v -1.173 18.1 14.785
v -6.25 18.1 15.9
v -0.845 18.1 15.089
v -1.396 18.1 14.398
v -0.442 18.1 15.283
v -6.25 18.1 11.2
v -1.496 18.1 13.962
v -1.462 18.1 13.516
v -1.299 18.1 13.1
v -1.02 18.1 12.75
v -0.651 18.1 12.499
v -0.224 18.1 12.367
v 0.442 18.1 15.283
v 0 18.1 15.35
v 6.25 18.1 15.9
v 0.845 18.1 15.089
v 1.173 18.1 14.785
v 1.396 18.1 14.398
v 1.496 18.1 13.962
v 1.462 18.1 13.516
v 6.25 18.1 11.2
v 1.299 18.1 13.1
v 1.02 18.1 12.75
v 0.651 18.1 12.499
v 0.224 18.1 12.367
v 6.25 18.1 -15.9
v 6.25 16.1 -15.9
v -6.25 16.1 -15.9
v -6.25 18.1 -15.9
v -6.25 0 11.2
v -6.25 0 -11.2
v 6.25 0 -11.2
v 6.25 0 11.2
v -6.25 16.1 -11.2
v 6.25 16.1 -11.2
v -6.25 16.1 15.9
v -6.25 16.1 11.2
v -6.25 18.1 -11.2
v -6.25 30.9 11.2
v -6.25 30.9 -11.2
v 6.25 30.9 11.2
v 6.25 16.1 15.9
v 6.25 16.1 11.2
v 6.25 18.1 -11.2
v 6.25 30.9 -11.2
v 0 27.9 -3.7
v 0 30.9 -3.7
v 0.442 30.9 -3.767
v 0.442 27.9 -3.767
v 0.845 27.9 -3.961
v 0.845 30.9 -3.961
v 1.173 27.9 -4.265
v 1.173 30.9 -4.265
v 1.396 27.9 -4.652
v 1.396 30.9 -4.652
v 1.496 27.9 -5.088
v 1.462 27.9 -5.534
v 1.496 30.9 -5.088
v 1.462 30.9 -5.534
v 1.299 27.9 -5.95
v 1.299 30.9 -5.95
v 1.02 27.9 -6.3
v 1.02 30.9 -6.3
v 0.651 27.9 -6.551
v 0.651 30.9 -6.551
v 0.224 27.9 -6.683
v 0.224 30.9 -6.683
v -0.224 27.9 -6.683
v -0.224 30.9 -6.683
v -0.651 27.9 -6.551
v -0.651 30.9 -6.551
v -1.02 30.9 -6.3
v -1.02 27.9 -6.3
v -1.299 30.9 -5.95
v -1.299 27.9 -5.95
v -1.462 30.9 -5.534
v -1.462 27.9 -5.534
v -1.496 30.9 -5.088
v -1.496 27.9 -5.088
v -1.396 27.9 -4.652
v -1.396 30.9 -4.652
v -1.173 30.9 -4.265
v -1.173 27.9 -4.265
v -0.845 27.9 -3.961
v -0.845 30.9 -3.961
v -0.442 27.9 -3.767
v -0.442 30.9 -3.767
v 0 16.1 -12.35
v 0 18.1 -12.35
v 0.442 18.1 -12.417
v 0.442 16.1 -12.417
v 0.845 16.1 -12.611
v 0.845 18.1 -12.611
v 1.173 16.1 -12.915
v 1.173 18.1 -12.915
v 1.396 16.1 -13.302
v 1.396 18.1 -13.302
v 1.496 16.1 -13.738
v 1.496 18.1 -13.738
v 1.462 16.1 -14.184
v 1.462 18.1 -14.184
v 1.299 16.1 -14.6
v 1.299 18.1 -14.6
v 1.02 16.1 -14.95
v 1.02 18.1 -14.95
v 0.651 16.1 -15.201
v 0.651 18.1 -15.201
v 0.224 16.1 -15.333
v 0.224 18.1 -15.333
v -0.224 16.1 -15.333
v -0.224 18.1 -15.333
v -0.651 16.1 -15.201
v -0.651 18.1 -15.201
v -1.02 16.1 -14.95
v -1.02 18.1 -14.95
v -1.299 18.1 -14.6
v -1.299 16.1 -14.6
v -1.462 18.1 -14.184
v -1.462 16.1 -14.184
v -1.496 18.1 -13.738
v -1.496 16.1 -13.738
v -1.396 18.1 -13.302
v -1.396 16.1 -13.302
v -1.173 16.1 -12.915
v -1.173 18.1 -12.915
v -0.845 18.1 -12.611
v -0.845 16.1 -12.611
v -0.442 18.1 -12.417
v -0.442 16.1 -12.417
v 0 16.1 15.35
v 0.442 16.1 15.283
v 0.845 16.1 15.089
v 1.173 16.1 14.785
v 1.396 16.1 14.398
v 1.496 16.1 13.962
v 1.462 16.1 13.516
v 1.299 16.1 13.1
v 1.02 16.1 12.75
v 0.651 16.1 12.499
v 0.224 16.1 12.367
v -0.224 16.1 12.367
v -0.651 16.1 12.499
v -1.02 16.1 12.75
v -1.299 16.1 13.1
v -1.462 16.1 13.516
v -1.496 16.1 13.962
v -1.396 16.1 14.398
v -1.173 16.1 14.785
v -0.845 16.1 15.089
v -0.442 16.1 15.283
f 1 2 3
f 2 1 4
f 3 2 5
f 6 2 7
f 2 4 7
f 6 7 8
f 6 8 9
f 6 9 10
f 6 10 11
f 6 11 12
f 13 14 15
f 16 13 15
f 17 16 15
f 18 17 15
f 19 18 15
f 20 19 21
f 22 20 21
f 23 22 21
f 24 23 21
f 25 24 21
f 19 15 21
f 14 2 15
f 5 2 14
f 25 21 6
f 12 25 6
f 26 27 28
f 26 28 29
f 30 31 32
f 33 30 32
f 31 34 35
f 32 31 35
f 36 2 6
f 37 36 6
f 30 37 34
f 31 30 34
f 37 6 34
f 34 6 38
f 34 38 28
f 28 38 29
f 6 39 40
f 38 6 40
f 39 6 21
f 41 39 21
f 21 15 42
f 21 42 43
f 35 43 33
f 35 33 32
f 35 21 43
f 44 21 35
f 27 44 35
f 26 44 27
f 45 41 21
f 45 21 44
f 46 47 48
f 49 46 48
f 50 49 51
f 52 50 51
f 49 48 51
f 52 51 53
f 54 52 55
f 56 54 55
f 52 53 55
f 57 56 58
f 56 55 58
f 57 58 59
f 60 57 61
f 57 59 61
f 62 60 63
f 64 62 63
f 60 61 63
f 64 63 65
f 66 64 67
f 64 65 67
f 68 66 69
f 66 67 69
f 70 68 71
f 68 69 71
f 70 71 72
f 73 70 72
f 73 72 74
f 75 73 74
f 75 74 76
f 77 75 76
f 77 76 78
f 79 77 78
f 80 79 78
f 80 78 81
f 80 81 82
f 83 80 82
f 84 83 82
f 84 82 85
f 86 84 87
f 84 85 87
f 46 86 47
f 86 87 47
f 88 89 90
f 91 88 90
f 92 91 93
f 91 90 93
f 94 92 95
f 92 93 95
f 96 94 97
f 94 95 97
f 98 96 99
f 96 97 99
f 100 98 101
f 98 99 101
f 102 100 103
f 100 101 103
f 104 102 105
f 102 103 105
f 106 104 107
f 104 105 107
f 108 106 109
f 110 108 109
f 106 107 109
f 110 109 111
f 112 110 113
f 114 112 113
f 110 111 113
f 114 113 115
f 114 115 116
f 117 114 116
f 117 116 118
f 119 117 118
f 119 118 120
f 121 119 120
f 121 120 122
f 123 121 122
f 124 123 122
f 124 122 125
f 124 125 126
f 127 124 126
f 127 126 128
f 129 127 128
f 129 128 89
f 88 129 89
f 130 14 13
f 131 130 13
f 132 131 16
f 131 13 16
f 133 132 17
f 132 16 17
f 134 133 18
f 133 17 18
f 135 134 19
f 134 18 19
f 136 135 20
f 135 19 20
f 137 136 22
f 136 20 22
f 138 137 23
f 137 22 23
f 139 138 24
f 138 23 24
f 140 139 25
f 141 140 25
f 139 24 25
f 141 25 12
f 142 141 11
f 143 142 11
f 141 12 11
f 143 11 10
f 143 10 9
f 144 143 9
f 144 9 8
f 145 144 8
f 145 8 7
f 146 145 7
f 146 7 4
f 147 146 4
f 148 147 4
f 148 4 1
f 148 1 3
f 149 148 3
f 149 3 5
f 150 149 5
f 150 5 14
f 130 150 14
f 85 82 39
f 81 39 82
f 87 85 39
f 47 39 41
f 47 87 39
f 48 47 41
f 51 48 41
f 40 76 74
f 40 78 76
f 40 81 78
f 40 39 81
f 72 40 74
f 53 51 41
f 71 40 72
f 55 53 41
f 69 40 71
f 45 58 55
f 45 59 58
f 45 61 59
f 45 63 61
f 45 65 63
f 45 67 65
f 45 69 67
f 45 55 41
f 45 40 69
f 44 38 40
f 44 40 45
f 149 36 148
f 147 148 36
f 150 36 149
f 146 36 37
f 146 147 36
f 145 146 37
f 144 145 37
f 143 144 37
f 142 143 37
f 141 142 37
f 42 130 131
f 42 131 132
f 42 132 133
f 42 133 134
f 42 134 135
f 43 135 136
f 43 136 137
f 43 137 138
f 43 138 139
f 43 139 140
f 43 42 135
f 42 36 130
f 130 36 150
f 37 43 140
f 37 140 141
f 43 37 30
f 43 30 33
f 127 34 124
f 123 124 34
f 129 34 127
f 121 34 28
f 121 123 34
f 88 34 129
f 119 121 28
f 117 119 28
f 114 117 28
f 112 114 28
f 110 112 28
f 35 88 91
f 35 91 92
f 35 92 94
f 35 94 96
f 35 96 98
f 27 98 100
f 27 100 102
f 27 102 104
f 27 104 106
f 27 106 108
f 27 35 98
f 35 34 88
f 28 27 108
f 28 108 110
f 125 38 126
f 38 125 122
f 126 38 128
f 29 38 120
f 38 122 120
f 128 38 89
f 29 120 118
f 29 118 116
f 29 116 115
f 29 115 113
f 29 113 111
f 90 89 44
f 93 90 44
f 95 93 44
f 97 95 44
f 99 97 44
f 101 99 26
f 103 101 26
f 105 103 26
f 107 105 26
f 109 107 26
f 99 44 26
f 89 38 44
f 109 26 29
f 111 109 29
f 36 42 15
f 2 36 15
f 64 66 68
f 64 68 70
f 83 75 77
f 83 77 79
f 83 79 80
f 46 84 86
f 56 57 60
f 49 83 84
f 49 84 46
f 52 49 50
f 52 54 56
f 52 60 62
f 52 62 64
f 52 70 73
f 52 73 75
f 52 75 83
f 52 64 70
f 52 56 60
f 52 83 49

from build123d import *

# Parameters (mm, degrees)
SKETCH_1_W          = 12.5
SKETCH_1_H          = 22.4
EXTRUDE_1_DEPTH     = 30.9
SKETCH_4_W          = 31.8
SKETCH_4_H          = 2
EXTRUDE_2_DEPTH     = 12.5
SKETCH_6_R          = 1.5
CUT_EXTRUDE_2_DEPTH = 25.889405377
SKETCH_7_R          = 1.5
CUT_EXTRUDE_3_DEPTH = 3


with BuildPart() as part:
    # 草图1 → 凸台-拉伸1 (new body)
    with BuildSketch(Plane(origin=(0, 0, 0), x_dir=(1, 0, 0), z_dir=(0, 1, 0))):
        Rectangle(SKETCH_1_W, SKETCH_1_H)
    extrude(amount=EXTRUDE_1_DEPTH)

    # 草图4 → 凸台-拉伸2 (add)
    with BuildSketch(Plane(origin=(6.25, 0, 0), x_dir=(0, 0, -1), z_dir=(1, 0, 0))):
        with Locations((0, 17.1)):
            Rectangle(SKETCH_4_W, SKETCH_4_H)
    extrude(amount=-EXTRUDE_2_DEPTH)

    # 草图6 → 切除-拉伸2 (cut, through all)
    with BuildSketch(Plane(origin=(0, 18.1, 0), x_dir=(1, 0, 0), z_dir=(0, 1, 0))):
        with Locations(Location((0, 13.85, 0), (0, 0, 270))):
            Circle(SKETCH_6_R)
        with Locations(Location((0, -13.85, 0), (0, 0, 270))):
            Circle(SKETCH_6_R)
    extrude(amount=-CUT_EXTRUDE_2_DEPTH, mode=Mode.SUBTRACT)

    # 草图7 → 切除-拉伸3 (cut)
    with BuildSketch(Plane(origin=(0, 30.9, 0), x_dir=(1, 0, 0), z_dir=(0, 1, 0))):
        with Locations(Location((0, 5.2, 0), (0, 0, 270))):
            Circle(SKETCH_7_R)
    extrude(amount=-CUT_EXTRUDE_3_DEPTH, mode=Mode.SUBTRACT)


solid = part.part
